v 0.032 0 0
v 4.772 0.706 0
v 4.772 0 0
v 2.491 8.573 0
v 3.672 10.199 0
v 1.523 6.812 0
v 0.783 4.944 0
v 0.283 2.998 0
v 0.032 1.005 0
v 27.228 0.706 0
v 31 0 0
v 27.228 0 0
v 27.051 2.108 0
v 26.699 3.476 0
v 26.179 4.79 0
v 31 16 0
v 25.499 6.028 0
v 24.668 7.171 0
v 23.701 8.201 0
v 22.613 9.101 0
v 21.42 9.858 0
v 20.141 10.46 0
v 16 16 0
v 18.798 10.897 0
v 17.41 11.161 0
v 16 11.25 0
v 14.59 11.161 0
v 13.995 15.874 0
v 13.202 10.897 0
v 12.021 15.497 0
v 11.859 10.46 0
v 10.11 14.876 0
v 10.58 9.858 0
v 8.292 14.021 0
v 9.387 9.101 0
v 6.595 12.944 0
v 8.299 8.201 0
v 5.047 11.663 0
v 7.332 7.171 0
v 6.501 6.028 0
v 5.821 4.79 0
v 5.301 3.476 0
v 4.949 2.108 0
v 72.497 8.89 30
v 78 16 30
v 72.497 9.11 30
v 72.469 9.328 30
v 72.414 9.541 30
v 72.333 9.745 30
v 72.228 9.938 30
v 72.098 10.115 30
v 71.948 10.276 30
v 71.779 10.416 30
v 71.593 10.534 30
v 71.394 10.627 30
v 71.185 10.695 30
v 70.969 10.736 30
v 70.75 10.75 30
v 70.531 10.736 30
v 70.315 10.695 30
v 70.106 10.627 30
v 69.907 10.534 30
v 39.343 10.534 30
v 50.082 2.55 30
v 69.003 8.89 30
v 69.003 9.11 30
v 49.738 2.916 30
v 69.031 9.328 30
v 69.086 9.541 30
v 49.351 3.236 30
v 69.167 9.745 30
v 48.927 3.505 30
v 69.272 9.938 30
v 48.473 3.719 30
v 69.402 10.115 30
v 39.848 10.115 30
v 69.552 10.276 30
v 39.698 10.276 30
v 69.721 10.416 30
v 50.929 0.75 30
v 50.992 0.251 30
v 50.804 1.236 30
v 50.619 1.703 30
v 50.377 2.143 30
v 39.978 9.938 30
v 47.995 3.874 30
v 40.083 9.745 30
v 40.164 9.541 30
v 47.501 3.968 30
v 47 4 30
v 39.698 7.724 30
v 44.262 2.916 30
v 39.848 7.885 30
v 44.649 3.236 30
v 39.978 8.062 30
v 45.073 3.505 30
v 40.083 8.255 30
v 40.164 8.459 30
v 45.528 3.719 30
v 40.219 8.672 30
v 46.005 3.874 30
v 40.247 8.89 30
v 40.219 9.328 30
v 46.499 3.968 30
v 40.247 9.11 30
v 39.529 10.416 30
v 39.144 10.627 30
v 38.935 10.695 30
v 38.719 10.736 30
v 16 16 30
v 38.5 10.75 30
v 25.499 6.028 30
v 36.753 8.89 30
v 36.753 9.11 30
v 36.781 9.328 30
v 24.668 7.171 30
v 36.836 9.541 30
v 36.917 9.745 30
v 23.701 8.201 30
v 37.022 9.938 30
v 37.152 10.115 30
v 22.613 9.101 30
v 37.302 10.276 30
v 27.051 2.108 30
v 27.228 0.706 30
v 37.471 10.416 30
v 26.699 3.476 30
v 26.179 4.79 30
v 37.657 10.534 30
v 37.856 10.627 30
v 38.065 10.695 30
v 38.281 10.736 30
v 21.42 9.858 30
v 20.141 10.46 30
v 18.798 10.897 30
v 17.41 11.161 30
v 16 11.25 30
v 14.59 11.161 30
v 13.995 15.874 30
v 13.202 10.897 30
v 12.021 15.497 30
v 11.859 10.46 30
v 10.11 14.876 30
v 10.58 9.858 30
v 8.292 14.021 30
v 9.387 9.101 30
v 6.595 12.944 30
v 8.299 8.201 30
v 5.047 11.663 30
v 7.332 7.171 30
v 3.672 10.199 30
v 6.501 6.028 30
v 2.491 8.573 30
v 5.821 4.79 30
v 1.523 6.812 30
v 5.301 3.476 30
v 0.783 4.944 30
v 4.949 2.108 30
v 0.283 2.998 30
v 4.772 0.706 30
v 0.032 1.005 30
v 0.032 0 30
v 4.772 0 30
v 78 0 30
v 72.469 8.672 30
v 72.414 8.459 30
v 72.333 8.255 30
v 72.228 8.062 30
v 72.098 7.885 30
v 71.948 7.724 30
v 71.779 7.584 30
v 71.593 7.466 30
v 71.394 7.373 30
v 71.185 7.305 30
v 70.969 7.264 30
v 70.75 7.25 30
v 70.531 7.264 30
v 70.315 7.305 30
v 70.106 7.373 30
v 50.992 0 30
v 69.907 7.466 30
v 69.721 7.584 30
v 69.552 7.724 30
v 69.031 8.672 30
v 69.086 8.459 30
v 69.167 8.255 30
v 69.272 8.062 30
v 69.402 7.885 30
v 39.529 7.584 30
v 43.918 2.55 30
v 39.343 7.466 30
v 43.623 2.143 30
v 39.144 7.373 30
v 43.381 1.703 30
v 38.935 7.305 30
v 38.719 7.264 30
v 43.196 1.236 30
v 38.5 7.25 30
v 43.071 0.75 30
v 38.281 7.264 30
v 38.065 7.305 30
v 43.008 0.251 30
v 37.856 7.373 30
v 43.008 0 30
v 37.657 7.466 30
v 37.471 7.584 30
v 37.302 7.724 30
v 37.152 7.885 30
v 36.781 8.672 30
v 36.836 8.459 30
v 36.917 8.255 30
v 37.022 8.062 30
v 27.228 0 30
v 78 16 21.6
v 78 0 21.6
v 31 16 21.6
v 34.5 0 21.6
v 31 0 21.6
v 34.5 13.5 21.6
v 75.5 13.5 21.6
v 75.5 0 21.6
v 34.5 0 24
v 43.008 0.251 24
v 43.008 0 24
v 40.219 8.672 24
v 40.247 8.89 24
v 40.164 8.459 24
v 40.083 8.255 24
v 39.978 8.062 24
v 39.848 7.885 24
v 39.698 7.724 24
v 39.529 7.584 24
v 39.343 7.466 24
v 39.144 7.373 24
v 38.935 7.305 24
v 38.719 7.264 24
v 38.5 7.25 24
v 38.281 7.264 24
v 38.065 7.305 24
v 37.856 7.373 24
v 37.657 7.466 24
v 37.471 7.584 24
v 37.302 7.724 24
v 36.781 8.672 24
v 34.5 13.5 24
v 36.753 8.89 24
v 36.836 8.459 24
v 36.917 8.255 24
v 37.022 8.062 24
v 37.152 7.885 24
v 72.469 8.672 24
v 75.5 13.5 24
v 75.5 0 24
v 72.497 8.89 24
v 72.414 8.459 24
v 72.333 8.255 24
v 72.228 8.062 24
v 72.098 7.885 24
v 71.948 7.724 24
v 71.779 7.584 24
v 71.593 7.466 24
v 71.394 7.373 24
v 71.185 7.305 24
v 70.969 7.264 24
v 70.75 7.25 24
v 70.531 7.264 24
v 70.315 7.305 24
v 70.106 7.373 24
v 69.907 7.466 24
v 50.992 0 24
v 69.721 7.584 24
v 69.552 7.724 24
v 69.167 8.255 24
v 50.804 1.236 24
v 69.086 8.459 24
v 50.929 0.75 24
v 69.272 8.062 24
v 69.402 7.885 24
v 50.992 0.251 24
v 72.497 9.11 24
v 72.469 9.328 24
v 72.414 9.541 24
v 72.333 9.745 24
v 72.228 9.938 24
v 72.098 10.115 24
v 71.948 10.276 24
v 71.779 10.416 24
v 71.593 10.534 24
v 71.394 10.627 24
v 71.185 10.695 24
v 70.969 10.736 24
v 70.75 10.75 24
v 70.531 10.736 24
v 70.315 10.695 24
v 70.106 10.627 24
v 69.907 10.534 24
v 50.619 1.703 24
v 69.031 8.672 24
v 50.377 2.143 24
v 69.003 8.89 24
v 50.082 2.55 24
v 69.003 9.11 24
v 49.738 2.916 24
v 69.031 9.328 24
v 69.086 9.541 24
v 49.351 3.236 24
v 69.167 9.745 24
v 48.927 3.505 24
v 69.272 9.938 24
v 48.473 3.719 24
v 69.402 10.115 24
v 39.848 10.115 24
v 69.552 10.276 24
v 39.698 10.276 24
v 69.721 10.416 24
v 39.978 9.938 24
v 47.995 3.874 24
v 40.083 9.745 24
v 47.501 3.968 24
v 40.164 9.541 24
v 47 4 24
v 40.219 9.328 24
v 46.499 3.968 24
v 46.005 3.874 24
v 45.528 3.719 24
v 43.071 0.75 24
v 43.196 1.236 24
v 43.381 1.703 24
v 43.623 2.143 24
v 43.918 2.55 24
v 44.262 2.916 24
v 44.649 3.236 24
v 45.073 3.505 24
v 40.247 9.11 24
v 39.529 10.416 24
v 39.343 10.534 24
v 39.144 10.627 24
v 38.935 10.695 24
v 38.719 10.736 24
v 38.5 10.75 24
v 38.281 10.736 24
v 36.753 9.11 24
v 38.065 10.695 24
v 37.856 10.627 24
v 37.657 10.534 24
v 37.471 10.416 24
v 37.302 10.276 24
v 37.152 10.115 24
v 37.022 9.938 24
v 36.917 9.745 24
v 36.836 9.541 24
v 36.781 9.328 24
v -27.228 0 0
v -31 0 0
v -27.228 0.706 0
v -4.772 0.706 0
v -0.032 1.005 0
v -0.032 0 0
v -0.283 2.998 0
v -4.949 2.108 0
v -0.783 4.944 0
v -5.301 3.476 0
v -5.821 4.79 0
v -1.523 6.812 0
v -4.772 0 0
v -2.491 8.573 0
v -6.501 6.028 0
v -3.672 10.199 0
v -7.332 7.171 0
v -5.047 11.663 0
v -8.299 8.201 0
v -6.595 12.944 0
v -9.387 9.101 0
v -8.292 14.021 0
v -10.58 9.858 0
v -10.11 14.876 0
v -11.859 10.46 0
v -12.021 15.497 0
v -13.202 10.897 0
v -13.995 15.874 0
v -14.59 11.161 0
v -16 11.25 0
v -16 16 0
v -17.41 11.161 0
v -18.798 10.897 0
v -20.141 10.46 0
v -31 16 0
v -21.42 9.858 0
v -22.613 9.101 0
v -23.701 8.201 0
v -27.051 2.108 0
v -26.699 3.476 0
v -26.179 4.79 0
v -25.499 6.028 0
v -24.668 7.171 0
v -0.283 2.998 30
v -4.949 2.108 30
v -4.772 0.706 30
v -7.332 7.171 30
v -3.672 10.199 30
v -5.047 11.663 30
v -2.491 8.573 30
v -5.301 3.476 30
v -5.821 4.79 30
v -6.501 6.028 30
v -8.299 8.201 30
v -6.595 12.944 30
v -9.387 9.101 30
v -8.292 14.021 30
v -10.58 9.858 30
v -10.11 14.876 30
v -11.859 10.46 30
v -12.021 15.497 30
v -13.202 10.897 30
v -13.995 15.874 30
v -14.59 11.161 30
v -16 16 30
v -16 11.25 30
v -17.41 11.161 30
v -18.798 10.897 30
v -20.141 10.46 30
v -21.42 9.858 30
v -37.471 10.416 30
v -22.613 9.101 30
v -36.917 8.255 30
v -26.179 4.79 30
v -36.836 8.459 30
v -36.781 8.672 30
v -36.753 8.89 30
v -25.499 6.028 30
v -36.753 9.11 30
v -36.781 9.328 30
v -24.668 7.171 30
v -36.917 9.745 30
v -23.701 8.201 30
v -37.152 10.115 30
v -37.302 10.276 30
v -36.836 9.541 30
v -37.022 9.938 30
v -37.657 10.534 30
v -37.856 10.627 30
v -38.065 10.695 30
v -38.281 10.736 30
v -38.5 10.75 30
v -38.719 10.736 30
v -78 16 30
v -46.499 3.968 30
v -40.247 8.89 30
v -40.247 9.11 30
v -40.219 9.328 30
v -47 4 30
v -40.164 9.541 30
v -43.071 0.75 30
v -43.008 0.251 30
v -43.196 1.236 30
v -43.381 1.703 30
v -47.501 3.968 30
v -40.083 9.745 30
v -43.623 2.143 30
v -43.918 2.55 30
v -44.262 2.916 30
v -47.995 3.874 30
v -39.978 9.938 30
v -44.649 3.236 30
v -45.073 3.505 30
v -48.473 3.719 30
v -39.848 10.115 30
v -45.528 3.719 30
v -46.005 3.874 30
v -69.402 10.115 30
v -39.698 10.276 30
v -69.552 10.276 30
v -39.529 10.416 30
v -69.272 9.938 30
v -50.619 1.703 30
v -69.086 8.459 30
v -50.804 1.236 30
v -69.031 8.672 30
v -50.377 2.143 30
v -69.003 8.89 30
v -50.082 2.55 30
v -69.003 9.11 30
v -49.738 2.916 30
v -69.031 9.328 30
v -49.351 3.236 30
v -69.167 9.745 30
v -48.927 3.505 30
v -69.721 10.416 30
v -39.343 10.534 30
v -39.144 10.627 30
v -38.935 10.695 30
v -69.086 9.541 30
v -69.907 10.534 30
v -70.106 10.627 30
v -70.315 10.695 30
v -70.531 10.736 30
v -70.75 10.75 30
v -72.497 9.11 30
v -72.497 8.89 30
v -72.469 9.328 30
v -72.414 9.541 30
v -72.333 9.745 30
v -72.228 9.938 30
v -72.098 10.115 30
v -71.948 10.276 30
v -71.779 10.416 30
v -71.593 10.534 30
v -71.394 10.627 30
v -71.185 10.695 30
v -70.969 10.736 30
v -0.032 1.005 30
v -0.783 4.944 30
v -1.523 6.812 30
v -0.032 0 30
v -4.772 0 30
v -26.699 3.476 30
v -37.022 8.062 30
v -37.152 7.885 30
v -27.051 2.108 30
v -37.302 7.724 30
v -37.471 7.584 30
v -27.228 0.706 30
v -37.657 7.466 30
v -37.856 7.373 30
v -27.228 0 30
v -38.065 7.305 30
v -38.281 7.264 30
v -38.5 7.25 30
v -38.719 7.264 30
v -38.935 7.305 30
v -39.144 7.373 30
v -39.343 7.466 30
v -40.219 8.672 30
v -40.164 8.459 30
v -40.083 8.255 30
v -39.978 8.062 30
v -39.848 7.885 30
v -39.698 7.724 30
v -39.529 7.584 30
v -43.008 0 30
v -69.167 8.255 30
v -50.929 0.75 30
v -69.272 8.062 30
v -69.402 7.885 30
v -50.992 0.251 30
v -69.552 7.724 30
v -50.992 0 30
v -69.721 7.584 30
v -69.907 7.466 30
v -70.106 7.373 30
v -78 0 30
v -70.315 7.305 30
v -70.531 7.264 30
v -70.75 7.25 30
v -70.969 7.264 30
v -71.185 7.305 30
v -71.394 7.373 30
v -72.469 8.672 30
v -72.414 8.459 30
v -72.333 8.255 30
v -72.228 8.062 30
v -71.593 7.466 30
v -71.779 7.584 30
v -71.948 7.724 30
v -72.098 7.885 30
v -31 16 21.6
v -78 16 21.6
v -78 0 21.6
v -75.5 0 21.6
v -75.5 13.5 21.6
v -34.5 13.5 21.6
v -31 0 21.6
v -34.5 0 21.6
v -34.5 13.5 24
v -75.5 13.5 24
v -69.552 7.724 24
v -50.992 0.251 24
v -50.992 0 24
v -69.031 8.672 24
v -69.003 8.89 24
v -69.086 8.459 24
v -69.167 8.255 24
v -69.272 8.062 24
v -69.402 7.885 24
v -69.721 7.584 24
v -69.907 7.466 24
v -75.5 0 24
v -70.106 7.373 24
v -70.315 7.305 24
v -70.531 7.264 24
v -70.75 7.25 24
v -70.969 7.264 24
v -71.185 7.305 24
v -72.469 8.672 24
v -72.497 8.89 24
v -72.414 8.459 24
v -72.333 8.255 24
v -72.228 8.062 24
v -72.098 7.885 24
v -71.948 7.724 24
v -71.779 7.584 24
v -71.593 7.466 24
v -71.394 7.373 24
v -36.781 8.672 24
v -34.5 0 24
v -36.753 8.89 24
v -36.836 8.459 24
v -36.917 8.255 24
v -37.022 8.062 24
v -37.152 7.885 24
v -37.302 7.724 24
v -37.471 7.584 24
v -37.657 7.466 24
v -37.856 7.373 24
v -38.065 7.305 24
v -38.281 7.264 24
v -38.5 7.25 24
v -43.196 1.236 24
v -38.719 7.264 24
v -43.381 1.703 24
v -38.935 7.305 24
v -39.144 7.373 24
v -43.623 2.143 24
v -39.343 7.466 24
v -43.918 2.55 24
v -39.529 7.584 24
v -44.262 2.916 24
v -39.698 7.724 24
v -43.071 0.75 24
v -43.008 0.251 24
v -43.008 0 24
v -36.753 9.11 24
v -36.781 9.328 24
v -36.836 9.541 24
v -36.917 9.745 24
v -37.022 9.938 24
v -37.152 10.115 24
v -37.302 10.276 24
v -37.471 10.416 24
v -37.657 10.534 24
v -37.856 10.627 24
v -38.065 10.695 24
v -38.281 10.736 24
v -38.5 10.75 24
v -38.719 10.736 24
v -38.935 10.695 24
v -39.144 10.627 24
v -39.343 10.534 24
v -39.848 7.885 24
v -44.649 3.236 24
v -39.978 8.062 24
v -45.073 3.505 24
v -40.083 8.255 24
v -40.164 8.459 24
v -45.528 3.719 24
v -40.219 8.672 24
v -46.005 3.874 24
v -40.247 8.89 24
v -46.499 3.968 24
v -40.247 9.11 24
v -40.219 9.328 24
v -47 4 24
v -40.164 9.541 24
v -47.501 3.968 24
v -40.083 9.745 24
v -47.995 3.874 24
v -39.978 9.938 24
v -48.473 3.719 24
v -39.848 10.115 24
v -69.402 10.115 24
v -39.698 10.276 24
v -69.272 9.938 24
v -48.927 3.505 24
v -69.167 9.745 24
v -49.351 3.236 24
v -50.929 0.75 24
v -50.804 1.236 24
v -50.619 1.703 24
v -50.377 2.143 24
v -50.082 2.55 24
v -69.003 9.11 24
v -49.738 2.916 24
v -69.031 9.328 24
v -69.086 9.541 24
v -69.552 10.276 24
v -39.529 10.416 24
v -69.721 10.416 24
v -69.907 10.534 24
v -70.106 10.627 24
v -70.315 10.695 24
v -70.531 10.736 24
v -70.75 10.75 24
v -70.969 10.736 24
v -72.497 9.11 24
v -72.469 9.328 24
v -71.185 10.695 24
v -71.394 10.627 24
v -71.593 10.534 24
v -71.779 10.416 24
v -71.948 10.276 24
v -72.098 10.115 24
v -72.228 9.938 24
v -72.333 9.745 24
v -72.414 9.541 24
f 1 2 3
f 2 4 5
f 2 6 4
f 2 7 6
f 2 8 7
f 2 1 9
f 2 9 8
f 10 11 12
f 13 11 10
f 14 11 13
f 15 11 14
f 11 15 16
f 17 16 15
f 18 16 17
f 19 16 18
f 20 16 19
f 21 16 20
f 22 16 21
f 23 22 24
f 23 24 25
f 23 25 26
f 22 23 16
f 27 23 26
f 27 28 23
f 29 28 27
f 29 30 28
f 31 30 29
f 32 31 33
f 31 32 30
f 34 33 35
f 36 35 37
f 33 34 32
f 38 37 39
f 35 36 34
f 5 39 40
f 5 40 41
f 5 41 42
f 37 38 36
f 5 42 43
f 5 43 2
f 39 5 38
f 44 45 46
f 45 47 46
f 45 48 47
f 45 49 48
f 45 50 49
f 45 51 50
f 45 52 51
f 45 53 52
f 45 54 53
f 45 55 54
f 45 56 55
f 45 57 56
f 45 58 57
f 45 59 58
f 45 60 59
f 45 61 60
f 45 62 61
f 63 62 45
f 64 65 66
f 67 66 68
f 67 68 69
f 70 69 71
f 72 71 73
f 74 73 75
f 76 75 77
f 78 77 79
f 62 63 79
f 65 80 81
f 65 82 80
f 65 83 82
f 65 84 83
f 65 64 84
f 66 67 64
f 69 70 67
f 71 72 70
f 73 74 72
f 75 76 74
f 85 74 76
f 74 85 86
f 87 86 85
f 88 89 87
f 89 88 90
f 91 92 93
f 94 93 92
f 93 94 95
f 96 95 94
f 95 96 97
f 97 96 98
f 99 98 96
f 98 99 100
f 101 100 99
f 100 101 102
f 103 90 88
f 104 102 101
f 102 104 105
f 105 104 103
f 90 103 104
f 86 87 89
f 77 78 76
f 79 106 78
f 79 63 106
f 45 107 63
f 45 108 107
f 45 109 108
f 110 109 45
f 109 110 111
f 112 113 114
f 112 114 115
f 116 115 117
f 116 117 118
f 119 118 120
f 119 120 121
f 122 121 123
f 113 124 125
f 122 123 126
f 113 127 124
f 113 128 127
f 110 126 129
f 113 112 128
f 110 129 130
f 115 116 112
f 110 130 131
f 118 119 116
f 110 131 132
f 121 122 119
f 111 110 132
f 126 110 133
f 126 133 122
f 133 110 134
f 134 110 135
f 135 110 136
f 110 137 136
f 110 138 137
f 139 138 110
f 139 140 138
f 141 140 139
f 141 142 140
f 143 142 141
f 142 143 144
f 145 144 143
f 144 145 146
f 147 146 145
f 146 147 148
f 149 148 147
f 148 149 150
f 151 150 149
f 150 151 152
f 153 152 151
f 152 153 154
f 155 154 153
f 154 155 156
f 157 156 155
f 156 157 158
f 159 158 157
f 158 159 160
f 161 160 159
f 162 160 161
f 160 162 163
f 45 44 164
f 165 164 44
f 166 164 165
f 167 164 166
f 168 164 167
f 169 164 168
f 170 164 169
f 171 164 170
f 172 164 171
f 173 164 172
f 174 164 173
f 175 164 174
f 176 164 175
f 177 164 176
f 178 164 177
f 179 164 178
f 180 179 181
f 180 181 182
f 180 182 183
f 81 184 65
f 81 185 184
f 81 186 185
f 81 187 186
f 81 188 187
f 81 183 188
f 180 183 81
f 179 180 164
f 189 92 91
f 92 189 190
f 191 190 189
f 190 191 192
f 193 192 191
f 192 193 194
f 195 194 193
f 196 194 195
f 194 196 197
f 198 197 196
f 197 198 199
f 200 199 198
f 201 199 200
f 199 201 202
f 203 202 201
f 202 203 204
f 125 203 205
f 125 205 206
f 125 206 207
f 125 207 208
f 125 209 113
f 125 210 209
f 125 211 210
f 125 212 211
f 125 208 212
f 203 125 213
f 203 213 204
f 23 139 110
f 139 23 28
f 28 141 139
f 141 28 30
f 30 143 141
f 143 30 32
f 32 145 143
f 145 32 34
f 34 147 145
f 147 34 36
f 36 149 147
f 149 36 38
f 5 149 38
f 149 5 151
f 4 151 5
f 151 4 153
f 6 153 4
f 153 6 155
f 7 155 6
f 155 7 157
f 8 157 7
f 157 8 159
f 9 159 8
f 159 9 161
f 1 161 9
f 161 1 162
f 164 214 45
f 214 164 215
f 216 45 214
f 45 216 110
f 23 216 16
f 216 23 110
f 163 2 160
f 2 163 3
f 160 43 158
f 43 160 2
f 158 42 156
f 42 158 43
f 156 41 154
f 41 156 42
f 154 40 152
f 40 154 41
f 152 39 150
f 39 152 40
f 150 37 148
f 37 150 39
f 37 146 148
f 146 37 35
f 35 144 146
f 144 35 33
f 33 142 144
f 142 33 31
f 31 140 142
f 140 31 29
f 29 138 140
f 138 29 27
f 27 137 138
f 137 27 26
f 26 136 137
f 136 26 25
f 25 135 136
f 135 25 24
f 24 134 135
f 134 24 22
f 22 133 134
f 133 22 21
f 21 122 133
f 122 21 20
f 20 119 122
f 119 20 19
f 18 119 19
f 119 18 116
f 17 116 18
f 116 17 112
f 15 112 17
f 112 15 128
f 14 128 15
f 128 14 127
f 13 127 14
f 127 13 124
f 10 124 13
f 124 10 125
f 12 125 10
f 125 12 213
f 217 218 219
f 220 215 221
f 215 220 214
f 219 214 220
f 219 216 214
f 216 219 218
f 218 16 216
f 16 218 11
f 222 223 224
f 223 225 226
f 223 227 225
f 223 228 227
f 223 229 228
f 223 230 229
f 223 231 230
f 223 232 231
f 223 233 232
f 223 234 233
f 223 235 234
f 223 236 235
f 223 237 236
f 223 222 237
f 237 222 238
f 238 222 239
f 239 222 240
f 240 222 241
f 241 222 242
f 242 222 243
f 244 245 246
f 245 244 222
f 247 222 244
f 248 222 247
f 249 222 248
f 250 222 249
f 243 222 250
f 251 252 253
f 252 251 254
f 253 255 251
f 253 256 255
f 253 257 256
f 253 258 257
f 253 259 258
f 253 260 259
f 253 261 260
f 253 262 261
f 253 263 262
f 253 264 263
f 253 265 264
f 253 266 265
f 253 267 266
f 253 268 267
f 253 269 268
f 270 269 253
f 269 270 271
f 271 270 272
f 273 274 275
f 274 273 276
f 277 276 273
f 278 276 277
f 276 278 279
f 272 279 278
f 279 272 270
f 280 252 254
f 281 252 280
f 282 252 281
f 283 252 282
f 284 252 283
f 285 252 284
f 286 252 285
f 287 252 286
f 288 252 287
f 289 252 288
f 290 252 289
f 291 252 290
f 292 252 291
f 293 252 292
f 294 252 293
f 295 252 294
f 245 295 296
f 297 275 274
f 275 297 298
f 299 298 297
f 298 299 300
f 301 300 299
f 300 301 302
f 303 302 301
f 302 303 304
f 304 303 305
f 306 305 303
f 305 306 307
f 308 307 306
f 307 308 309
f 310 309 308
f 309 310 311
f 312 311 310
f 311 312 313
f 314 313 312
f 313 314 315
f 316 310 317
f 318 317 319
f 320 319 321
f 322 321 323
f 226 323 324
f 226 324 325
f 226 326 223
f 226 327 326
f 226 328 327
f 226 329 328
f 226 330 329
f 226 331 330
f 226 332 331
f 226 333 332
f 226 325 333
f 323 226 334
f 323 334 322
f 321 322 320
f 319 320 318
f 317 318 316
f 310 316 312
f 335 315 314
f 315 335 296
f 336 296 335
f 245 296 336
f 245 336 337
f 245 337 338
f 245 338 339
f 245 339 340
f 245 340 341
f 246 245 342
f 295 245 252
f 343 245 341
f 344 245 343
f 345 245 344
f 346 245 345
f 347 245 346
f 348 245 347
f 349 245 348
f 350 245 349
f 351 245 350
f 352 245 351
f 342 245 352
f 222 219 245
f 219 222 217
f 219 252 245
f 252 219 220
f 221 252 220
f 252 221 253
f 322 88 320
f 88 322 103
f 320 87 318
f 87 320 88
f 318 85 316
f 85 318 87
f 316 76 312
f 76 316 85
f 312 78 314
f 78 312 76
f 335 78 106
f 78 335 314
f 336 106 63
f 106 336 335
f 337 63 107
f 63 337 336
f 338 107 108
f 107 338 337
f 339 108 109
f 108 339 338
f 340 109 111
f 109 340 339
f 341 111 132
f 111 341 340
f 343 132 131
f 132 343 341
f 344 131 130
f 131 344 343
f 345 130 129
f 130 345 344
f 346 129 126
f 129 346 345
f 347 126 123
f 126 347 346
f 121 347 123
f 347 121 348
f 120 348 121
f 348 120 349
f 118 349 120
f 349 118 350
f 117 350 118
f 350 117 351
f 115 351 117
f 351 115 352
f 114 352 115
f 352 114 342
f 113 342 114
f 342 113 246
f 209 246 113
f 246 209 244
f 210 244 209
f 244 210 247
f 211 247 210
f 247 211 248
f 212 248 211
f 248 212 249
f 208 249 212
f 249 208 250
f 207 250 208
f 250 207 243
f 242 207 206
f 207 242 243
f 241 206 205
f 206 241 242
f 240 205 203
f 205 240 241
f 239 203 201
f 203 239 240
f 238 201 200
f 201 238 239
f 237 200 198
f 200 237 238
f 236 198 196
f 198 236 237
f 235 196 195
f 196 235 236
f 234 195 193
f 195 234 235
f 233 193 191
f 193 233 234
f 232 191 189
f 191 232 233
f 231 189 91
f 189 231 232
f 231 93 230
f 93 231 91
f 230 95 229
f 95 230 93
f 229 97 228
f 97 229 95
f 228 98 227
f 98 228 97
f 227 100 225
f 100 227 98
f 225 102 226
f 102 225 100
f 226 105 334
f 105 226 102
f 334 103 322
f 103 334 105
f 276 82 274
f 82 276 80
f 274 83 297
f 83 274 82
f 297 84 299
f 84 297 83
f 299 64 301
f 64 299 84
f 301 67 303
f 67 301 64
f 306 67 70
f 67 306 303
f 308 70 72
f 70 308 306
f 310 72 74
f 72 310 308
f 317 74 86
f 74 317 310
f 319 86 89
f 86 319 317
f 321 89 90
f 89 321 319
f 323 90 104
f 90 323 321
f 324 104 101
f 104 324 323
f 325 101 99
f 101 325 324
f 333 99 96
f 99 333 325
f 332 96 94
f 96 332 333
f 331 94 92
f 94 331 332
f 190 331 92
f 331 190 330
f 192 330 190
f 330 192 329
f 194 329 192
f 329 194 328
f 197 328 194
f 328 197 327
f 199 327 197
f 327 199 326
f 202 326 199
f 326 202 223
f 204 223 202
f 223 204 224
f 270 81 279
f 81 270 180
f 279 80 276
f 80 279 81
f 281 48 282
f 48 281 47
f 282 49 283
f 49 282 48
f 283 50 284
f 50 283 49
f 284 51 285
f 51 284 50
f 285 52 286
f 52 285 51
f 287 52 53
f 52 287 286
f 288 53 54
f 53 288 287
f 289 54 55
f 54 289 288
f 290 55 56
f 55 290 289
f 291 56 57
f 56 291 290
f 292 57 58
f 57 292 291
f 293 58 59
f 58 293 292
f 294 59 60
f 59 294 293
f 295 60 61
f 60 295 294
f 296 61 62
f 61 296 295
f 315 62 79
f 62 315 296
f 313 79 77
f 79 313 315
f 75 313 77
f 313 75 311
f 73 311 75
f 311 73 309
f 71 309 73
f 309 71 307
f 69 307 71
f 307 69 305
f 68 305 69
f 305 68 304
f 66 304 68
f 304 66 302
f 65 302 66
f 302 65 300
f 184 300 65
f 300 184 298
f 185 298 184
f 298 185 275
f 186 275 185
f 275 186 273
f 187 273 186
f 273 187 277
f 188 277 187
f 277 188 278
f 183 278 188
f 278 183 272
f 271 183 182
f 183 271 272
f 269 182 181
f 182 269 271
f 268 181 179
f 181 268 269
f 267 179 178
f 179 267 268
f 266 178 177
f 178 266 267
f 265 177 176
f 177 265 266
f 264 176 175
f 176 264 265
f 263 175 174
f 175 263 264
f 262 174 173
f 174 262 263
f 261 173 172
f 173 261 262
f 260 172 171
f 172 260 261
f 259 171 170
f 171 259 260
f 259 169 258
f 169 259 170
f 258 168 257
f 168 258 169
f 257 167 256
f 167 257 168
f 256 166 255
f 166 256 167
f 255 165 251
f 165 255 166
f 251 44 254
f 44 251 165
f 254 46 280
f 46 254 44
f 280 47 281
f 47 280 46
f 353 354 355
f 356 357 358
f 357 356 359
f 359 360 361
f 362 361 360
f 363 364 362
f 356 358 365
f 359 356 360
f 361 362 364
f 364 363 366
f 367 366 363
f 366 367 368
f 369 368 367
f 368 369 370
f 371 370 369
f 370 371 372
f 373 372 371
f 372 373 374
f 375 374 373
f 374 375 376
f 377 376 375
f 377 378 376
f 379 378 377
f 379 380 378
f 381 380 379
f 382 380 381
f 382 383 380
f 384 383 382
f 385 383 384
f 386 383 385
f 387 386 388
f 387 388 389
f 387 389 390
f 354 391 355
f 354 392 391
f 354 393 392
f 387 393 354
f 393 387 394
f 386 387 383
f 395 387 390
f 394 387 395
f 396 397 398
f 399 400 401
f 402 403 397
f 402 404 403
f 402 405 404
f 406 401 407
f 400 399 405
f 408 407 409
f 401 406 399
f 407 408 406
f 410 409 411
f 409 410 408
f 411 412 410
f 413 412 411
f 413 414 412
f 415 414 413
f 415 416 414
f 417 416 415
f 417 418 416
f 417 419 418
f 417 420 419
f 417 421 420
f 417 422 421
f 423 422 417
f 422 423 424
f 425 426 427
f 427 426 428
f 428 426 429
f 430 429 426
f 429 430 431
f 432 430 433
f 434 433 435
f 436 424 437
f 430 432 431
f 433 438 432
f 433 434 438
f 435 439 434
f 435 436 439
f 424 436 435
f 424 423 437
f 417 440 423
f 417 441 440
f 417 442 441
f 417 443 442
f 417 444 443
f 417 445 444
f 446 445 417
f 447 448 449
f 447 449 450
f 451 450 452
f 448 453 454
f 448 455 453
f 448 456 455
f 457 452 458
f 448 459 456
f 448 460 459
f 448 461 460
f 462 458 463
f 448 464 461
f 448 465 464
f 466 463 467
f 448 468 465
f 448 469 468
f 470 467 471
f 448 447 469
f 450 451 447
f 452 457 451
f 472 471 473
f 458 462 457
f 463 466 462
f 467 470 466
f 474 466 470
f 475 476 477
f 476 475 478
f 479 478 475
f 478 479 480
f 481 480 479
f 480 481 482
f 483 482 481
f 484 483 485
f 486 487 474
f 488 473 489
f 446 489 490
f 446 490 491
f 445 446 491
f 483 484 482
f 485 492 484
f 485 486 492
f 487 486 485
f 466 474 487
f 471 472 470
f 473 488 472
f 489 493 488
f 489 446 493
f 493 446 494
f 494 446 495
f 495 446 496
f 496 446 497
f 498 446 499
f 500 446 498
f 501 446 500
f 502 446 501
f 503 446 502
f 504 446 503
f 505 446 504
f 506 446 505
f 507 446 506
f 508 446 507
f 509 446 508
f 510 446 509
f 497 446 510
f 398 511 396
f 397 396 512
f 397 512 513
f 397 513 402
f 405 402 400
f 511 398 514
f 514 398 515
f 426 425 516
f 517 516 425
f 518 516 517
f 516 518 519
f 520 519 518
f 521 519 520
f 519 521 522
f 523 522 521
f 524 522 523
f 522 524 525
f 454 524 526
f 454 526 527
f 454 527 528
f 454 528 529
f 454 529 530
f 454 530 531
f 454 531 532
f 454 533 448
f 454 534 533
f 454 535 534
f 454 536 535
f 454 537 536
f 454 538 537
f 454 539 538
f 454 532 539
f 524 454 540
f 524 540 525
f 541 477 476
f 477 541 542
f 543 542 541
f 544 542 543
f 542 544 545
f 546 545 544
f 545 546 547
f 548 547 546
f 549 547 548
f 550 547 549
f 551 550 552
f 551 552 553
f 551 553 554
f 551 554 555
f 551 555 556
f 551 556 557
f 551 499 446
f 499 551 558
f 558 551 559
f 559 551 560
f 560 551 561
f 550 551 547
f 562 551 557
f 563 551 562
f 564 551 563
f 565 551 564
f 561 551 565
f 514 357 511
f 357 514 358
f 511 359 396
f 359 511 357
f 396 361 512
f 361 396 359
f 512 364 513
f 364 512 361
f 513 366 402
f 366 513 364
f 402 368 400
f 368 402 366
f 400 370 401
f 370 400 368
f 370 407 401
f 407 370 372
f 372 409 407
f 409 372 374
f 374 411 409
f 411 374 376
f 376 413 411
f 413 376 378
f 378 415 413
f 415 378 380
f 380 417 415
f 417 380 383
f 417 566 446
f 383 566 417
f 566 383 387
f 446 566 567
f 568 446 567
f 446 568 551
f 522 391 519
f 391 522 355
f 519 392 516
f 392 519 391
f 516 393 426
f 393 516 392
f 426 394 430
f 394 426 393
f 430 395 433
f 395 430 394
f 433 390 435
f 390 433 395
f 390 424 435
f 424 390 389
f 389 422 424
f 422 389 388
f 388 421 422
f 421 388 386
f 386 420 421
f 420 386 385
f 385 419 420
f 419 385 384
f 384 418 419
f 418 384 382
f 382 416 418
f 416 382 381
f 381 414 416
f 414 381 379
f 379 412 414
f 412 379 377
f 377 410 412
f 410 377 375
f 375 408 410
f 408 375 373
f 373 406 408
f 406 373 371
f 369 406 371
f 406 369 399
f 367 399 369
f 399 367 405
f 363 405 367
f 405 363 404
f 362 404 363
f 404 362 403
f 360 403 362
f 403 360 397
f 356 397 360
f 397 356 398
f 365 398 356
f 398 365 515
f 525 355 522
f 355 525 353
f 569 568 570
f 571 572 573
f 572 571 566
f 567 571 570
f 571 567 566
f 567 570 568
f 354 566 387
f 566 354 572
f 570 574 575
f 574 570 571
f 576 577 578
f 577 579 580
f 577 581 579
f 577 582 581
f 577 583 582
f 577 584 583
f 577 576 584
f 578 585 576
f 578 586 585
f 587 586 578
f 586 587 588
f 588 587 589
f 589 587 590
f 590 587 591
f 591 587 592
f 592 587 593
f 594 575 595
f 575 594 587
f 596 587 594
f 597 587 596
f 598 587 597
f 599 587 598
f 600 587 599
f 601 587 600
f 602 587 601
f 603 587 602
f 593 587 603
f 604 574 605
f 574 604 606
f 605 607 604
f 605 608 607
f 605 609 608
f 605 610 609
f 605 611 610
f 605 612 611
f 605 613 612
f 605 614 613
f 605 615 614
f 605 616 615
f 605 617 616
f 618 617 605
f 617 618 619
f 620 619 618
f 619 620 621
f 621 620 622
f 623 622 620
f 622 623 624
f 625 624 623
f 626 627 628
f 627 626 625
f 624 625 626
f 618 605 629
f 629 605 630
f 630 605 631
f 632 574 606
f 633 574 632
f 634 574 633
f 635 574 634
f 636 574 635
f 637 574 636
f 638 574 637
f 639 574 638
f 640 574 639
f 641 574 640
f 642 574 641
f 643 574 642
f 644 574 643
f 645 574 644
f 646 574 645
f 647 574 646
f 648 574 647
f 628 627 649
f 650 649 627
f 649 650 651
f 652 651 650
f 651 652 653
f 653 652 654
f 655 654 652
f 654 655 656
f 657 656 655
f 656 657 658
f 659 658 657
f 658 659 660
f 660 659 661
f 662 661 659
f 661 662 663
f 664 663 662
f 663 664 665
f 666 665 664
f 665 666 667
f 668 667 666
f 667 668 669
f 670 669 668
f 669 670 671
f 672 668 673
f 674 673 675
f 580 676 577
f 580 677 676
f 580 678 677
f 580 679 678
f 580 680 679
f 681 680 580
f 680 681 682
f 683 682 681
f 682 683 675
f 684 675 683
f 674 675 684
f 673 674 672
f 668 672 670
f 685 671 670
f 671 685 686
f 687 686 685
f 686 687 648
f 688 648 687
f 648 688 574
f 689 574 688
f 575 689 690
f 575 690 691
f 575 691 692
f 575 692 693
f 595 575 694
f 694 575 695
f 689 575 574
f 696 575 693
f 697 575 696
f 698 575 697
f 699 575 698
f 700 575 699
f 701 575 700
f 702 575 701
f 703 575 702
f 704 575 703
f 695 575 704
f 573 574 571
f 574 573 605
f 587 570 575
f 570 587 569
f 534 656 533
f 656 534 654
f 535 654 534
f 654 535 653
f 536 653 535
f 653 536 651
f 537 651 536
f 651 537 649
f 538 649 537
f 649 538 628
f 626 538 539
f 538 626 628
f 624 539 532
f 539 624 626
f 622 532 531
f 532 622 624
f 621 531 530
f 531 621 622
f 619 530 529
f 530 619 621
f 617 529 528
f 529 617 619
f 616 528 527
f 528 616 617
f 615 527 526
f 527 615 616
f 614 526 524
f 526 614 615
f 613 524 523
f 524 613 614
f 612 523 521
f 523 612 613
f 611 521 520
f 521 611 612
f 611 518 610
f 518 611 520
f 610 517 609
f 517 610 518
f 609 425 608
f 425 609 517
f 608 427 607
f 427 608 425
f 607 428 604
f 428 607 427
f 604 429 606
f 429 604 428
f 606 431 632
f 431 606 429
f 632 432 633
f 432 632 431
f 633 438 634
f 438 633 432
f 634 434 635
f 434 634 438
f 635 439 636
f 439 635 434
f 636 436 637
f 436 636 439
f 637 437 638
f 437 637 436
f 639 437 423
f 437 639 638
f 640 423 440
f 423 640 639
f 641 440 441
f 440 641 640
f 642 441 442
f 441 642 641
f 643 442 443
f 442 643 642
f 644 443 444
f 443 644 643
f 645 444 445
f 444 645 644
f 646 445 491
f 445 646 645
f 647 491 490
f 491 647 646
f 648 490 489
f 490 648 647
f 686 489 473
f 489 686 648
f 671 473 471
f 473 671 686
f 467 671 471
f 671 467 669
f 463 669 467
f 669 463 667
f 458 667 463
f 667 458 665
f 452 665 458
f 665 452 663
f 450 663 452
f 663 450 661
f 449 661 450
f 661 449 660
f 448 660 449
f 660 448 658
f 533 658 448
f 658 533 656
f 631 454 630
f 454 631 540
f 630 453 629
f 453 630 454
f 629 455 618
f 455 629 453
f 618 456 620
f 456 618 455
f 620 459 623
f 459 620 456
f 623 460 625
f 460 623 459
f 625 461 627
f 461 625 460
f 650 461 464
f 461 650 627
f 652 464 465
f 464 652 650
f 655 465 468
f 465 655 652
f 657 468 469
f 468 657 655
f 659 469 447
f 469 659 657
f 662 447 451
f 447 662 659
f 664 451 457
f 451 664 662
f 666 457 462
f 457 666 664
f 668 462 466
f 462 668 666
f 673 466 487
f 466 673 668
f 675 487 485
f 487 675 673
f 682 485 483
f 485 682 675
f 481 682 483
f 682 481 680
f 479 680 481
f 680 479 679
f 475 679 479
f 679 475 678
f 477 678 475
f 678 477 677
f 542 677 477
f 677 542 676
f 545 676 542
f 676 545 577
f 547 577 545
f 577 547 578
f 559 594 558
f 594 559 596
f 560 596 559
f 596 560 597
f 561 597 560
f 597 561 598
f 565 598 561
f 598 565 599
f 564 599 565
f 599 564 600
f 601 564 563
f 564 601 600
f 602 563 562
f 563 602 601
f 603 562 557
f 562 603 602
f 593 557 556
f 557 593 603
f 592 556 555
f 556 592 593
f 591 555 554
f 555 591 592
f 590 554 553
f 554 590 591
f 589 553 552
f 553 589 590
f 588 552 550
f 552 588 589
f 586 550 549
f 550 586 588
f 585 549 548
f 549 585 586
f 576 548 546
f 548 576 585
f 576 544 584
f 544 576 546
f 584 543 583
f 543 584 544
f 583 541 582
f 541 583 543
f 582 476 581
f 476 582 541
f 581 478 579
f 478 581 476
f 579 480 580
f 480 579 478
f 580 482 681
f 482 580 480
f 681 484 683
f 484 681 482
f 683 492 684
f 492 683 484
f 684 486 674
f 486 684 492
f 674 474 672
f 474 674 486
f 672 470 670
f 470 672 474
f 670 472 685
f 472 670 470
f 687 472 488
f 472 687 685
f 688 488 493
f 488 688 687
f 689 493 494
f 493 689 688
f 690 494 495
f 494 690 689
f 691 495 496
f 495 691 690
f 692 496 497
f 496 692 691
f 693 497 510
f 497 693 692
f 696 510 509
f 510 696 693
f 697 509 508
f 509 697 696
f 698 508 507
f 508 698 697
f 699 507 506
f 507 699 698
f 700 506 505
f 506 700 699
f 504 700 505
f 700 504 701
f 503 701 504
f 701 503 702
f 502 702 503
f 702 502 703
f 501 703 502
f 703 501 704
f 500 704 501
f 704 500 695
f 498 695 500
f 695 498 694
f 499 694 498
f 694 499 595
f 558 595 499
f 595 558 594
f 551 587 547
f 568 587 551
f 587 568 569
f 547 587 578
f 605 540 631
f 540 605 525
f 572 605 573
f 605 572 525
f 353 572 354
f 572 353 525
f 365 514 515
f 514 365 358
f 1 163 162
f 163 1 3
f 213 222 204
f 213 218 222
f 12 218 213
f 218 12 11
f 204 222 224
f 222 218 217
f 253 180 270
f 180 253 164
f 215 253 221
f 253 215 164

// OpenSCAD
/****************************************************************************
 *   Open-Source Whole Home Water Shutoff System                            *
 *   Copyright 2021 Marcio Teixeira                                         *
 *                                                                          *
 *   This program is free software: you can redistribute it and/or modify   *
 *   it under the terms of the GNU General Public License as published by   *
 *   the Free Software Foundation, either version 3 of the License, or      *
 *   (at your option) any later version.                                    *
 *                                                                          *
 *   This program is distributed in the hope that it will be useful,        *
 *   but WITHOUT ANY WARRANTY; without even the implied warranty of         *
 *   MERCHANTABILITY or FITNESS FOR A PARTICULAR PURPOSE.  See the          *
 *   GNU General Public License for more details.                           *
 *                                                                          *
 *   To view a copy of the GNU General Public License, go to the following  *
 *   location: <http://www.gnu.org/licenses/>.                              *
 ****************************************************************************/

$fn          = 50;
pipe_dia     = 22.5;
mount_width  = 32;
mount_height = 46;
mount_depth  = 30;
motor_depth  = 21.6;
thickness    = (mount_width - pipe_dia)/2;
total_h      = mount_height + thickness*2 + pipe_dia;

module body() {
    linear_extrude(mount_depth) {
        difference() {
            union() {
                translate([-mount_width/2,0])
                    square([mount_width, mount_height+thickness+pipe_dia/2]);
                translate([0,mount_height+pipe_dia/2+thickness])
                    circle(pipe_dia/2+thickness);
            }
            translate([0,mount_height+pipe_dia/2+thickness])
                circle(pipe_dia/2);
        }
    }
}

module cutout() {
    linear_extrude(motor_depth)
        translate([-mount_width/2-0.5,0])
            square([mount_width+1, mount_height+1]);
}

module cutout2(inset = 2.5) {
    w = mount_width - inset*2;
    h = mount_height - inset*2;
    linear_extrude(24)
        translate([-w/2,inset])
            square([w,h]);
}

module screw_holes() {
    linear_extrude(mount_depth+1) {
        translate([-9,39.5]) circle(r=1.75);
        translate([ 9,39.5]) circle(r=1.75);
        translate([ 0,31.0]) circle(r=4);
        translate([-9,7.25]) circle(r=1.75);
        translate([ 9,7.25]) circle(r=1.75);
    }
}

module clamp() {
    difference() {
        body();
        cutout();
        cutout2();
        screw_holes();
    }
}

difference() {
    union() {
        rotate([0,0,90])
        translate([0,-total_h,0])
            clamp();
        rotate([0,0,-90])
            translate([0,-total_h,0])
                clamp();
    }
    translate([0,-500,0])
    cube([1000,1000,1000], center=true);
}
